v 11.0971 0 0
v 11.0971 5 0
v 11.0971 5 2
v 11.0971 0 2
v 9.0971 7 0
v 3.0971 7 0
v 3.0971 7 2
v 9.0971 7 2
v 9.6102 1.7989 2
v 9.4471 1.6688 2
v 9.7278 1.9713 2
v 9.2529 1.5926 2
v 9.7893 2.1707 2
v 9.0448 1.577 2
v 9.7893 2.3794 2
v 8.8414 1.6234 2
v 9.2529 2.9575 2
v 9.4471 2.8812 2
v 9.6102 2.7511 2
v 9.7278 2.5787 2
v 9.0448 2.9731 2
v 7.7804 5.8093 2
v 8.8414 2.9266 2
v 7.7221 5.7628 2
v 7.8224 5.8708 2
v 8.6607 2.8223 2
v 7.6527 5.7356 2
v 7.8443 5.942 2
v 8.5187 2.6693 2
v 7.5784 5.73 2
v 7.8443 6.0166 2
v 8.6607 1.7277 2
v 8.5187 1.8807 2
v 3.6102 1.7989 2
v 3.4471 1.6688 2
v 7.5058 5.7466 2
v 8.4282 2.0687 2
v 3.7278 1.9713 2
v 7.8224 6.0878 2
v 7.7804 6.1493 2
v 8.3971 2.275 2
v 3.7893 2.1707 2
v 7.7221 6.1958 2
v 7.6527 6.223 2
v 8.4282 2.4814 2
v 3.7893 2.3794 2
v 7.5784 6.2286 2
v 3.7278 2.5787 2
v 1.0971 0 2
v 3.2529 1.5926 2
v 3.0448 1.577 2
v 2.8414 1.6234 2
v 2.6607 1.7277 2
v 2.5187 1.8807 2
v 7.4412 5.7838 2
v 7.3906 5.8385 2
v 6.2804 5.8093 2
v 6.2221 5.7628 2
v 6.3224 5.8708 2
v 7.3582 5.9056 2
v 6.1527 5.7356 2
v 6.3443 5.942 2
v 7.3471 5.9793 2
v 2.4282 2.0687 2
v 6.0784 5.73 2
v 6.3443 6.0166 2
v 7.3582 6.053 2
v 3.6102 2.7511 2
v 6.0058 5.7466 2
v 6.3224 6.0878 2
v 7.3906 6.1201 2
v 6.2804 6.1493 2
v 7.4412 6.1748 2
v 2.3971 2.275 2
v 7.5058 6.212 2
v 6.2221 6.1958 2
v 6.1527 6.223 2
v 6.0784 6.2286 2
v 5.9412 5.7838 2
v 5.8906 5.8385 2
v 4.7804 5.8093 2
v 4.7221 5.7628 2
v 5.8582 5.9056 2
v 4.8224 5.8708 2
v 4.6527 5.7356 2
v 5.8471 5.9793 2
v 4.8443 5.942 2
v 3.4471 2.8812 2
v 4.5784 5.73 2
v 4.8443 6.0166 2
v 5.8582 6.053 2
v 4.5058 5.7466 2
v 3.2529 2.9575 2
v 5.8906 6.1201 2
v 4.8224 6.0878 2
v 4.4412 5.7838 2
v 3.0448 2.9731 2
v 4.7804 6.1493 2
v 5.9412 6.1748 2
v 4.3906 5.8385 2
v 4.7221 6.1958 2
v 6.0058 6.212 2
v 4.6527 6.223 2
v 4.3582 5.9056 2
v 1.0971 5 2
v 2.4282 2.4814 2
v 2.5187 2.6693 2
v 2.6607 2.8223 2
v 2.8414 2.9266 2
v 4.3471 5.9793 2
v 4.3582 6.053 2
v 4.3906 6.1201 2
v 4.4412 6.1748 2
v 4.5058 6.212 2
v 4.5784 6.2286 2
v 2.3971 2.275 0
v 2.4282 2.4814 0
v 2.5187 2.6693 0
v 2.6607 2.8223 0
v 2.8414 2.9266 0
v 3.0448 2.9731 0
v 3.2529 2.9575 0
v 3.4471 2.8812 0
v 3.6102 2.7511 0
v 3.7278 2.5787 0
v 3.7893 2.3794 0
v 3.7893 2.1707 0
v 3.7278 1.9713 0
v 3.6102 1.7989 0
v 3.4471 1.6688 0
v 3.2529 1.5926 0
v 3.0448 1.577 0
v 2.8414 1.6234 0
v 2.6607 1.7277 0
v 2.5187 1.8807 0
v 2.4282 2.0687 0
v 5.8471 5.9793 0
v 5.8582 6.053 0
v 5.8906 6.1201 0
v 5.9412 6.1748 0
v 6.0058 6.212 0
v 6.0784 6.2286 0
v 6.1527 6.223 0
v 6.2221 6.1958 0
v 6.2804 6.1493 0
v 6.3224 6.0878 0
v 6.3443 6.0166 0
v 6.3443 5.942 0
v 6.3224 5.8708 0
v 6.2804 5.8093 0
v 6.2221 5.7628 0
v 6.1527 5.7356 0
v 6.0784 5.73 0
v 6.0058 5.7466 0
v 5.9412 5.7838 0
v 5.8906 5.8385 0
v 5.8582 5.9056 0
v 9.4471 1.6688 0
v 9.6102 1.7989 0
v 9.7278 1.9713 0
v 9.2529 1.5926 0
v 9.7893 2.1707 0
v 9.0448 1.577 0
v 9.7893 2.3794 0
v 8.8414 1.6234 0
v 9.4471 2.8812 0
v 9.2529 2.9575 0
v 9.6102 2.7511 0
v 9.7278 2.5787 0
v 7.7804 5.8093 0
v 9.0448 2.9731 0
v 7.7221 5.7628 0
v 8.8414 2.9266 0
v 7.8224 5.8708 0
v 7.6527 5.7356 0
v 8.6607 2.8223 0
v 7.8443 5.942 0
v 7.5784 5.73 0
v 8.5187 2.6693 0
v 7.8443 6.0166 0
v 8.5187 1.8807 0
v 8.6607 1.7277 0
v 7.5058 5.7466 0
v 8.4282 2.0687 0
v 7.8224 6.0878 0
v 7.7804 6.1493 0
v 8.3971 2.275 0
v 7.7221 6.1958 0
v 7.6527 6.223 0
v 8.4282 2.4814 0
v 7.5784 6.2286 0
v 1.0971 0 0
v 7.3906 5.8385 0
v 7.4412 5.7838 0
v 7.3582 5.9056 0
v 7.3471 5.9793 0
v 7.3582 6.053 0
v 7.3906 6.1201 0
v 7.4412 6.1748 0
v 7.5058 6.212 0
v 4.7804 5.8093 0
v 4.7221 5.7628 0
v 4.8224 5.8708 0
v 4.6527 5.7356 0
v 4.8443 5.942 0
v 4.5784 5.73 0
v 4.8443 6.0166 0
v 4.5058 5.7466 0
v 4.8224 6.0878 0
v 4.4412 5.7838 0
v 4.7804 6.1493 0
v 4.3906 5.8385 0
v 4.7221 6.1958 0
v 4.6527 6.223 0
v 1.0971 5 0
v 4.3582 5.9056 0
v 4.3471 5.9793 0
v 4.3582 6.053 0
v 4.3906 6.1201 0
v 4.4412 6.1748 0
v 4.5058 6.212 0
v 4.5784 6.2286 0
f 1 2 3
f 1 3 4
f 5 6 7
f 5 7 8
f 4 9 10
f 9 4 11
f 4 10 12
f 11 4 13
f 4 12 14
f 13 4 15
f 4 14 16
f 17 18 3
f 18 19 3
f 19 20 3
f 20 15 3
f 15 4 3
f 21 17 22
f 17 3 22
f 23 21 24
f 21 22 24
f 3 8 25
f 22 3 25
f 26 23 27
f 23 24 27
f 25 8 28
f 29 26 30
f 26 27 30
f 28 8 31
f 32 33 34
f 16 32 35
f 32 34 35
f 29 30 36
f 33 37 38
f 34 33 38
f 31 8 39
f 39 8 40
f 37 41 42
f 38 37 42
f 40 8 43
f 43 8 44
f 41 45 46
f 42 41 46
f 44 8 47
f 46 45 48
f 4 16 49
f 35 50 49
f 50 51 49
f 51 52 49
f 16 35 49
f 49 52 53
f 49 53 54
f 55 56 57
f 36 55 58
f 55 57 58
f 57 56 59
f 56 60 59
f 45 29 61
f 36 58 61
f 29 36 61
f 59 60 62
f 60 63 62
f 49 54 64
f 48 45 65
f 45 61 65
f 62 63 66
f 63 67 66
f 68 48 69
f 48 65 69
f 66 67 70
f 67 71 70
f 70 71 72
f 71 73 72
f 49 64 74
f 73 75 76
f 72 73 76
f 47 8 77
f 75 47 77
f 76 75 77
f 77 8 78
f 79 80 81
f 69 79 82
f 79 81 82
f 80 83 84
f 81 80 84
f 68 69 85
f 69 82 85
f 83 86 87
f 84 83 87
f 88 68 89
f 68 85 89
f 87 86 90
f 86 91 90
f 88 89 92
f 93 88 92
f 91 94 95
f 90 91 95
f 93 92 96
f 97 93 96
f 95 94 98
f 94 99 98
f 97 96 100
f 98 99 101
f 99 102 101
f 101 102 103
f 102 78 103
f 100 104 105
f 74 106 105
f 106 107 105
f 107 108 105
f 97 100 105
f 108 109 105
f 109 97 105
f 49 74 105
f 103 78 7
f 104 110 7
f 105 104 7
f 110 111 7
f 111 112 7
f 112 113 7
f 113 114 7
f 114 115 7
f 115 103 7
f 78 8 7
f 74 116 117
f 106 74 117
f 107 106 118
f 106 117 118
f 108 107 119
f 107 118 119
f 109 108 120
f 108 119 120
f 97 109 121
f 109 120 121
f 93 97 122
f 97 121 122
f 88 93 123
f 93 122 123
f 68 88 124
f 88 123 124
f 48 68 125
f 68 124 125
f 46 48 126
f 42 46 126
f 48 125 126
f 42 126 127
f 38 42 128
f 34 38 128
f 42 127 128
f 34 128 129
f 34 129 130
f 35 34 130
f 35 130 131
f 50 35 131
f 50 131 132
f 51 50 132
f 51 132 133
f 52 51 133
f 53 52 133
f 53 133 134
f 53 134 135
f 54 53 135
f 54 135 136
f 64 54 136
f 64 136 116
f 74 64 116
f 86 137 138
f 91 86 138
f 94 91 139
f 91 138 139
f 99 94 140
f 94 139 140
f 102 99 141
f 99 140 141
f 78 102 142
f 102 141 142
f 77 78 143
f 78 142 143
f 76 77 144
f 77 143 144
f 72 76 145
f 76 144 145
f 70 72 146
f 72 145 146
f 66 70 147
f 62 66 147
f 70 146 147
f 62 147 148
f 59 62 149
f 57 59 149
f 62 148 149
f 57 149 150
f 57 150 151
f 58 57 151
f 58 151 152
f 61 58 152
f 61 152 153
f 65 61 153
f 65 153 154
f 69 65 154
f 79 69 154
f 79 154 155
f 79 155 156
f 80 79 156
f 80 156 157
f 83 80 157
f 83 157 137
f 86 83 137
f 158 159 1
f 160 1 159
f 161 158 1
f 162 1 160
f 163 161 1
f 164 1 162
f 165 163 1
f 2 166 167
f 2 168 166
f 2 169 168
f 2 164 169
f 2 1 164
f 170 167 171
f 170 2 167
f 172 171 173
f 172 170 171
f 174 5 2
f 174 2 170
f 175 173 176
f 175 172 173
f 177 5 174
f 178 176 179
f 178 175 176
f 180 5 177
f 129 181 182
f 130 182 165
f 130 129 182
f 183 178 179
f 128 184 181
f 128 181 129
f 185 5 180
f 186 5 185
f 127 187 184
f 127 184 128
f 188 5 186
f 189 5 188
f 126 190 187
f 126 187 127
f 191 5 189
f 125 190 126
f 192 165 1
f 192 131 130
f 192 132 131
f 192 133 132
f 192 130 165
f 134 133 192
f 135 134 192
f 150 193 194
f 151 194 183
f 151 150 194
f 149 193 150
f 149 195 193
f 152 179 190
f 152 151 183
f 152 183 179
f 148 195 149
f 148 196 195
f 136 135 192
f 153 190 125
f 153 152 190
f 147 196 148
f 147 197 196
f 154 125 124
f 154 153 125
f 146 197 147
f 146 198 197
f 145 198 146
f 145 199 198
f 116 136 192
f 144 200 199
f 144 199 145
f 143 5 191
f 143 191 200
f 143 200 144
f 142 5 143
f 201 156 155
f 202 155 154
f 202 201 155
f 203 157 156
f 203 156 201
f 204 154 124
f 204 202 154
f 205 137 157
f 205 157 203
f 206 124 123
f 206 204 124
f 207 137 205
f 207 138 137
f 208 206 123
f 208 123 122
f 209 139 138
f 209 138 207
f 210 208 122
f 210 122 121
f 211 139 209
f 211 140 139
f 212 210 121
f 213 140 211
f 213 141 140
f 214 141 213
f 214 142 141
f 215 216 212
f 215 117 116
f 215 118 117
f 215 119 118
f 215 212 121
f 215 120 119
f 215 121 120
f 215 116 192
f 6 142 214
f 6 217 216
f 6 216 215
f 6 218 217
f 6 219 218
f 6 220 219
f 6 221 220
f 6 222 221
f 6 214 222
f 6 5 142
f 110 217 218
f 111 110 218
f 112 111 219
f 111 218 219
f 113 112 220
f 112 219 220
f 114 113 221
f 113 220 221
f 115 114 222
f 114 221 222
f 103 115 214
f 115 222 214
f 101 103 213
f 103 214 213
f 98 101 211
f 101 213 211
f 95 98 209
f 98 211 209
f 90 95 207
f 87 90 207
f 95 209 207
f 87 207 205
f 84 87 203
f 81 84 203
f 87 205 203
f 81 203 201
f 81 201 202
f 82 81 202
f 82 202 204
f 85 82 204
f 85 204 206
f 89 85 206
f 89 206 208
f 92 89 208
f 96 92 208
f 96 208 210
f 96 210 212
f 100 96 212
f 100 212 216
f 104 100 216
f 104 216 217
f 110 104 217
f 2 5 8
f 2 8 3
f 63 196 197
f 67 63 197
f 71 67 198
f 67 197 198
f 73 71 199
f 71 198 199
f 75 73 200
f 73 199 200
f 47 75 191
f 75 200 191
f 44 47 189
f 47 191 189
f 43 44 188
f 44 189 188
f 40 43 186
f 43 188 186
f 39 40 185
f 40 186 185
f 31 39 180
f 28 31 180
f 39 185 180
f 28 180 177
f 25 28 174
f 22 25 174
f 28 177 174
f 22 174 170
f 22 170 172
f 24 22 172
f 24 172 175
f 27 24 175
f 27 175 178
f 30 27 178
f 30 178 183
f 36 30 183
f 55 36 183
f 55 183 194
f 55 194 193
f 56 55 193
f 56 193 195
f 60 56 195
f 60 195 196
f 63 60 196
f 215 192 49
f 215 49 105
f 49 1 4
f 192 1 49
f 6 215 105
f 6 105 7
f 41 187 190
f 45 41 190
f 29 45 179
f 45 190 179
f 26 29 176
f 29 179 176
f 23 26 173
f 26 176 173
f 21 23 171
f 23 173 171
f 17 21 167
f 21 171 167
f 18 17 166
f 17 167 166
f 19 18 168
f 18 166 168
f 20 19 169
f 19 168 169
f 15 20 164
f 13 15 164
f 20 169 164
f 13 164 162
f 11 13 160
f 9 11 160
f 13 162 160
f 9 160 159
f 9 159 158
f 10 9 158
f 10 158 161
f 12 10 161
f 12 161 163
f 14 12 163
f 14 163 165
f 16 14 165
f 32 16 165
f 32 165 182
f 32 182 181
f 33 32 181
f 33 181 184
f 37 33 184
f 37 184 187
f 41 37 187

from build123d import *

# Parameters (mm, degrees)
BOSS_EXTRUDE1_DEPTH            = 2
F_1_4_1_4_DIAMETER_HOLE1_D     = 1.4
F_1_4_1_4_DIAMETER_HOLE1_DEPTH = 10
F_1_4_1_4_DIAMETER_HOLE1_TIP   = 0.420602433
F_0_5_0_5_DIAMETER_HOLE1_D     = 0.5
F_0_5_0_5_DIAMETER_HOLE1_DEPTH = 10
F_0_5_0_5_DIAMETER_HOLE1_TIP   = 0.150215155


with BuildPart() as part:
    # Sketch1 → Boss-Extrude1 (new body)
    with BuildSketch(Plane.XY):
        Polygon((1.097109919, 0), (1.097109919, 5), (3.097109919, 7), (9.097109919, 7), (11.097109919, 5), (11.097109919, 0), align=None)
    extrude(amount=BOSS_EXTRUDE1_DEPTH)

    # Ø1.4 (1.4) Diameter Hole1
    with Locations(Plane.XY.offset(2)):
        with Locations((3.097109919, 2.27502281), (9.097109919, 2.27502281)):
            Hole(F_1_4_1_4_DIAMETER_HOLE1_D / 2, depth=F_1_4_1_4_DIAMETER_HOLE1_DEPTH)
            with Locations((0, 0, -(F_1_4_1_4_DIAMETER_HOLE1_DEPTH + F_1_4_1_4_DIAMETER_HOLE1_TIP / 2))):  # 118° drill point
                Cone(0, F_1_4_1_4_DIAMETER_HOLE1_D / 2, F_1_4_1_4_DIAMETER_HOLE1_TIP, mode=Mode.SUBTRACT)

    # Ø0.5 (0.5) Diameter Hole1
    with Locations(Plane.XY.offset(2)):
        with Locations((6.097109919, 5.979300112), (4.597109919, 5.979300112), (7.597109919, 5.979300112)):
            Hole(F_0_5_0_5_DIAMETER_HOLE1_D / 2, depth=F_0_5_0_5_DIAMETER_HOLE1_DEPTH)
            with Locations((0, 0, -(F_0_5_0_5_DIAMETER_HOLE1_DEPTH + F_0_5_0_5_DIAMETER_HOLE1_TIP / 2))):  # 118° drill point
                Cone(0, F_0_5_0_5_DIAMETER_HOLE1_D / 2, F_0_5_0_5_DIAMETER_HOLE1_TIP, mode=Mode.SUBTRACT)


solid = part.part
